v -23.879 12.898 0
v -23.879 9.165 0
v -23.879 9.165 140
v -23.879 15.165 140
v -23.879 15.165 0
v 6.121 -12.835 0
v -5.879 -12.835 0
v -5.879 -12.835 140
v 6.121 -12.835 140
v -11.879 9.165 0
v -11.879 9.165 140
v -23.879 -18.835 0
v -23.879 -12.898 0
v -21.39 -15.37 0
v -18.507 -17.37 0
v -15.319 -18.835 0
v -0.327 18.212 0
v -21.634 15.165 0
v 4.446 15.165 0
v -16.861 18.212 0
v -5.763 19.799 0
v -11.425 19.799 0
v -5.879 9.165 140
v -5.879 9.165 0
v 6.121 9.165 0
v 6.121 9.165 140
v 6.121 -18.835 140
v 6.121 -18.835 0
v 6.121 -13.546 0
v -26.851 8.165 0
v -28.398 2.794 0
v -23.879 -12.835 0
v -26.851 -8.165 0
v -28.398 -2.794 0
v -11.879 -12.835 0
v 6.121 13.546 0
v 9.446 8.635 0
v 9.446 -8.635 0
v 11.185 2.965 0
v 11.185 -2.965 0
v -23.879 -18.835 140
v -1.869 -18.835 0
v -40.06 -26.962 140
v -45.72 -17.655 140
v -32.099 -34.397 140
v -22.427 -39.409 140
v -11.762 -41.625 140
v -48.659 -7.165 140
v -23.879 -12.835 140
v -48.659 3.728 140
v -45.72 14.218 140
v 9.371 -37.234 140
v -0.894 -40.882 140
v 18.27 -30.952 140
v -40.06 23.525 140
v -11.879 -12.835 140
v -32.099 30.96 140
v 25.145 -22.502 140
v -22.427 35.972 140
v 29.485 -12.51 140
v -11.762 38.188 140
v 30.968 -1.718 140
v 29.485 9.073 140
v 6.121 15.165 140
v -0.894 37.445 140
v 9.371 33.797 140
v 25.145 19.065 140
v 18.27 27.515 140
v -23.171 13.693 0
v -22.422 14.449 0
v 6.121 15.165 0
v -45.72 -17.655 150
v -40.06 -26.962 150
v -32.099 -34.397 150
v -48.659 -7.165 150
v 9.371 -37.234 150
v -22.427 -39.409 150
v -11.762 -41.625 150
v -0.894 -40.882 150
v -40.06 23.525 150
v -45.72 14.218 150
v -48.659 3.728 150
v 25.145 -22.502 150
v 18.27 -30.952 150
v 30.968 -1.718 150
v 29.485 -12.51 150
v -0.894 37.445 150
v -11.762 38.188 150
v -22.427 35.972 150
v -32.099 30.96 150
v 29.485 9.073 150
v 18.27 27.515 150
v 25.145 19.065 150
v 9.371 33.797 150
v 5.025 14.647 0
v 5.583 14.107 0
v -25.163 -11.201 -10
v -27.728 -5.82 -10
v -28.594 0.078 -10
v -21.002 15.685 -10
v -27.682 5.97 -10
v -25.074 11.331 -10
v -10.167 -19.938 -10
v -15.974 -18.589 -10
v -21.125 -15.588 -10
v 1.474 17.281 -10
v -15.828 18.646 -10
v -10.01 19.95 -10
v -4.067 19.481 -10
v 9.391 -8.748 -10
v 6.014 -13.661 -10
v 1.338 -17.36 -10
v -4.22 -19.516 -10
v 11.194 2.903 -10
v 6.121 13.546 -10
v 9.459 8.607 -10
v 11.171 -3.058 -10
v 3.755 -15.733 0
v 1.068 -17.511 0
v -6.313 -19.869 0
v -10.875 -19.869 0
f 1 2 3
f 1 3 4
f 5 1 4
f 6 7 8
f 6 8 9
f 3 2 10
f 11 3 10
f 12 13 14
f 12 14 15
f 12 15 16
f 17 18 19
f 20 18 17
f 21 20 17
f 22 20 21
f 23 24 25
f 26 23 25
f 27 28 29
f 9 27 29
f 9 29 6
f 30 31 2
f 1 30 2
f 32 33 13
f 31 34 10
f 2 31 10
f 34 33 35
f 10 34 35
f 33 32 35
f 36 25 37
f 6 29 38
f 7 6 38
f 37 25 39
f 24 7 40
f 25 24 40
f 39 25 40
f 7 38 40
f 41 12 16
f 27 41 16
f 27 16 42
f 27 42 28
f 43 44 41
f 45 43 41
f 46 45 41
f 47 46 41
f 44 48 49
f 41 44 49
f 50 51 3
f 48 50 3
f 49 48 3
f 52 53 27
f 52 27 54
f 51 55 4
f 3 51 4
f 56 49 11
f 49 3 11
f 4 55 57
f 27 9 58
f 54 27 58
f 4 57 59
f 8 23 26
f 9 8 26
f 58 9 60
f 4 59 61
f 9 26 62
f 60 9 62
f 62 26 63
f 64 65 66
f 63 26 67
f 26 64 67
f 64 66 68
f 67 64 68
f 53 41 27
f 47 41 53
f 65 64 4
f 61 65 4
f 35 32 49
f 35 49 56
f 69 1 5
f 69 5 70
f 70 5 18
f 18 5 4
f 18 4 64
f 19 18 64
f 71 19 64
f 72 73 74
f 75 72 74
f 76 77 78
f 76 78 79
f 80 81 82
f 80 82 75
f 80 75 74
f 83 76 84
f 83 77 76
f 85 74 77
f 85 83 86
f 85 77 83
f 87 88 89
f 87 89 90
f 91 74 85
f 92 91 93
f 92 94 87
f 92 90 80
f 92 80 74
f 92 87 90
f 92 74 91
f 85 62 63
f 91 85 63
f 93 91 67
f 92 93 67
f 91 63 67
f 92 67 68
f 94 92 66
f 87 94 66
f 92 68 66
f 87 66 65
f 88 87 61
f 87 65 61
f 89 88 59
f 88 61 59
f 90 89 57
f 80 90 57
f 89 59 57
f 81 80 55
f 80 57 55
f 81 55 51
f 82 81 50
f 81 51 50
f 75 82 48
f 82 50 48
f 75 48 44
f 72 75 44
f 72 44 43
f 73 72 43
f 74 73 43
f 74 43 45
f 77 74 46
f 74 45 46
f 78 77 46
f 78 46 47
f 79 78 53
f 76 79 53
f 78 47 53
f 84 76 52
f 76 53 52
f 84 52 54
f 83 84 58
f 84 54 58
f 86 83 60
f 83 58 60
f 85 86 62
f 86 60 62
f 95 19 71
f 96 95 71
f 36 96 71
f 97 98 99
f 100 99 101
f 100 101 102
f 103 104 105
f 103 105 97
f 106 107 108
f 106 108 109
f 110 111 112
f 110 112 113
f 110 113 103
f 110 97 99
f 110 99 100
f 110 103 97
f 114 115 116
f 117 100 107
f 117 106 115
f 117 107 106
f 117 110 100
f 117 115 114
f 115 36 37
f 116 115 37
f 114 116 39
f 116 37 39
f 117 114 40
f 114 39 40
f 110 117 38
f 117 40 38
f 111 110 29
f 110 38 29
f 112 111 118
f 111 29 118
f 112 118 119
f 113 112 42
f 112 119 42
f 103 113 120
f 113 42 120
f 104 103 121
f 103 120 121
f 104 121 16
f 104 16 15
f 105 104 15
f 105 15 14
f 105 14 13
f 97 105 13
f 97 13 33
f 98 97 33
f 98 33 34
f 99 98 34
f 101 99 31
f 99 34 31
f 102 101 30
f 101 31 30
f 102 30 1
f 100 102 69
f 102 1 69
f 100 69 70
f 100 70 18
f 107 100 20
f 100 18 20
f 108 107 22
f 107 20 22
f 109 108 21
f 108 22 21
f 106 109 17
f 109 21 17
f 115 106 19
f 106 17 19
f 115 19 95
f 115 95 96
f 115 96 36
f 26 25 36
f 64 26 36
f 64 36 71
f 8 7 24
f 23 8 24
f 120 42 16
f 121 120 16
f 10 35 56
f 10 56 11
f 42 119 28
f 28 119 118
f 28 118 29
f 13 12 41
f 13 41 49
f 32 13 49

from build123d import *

# Parameters (mm, degrees)
SKETCH4_W           = 30
SKETCH4_H           = 6
SKETCH4_W_2         = 6
SKETCH4_H_2         = 22
BOSS_EXTRUDE1_DEPTH = 140
SKETCH6_R           = 20
BOSS_EXTRUDE2_DEPTH = 10
SKETCH7_R           = 40
BOSS_EXTRUDE3_DEPTH = 10


with BuildPart() as part:
    # Sketch4 → Boss-Extrude1 (new body)
    with BuildSketch(Plane(origin=(1.761790339, -4.428283824, 0), x_dir=(1, 0, 0), z_dir=(0, 0, 1))):
        with Locations((-10.641284089, 16.5928688)):
            Rectangle(SKETCH4_W, SKETCH4_H)
        with Locations((-10.641284089, 2.5928688)):
            Rectangle(SKETCH4_W_2, SKETCH4_H_2)
        with Locations((-10.641284089, -11.4071312)):
            Rectangle(SKETCH4_W, SKETCH4_H)
    extrude(amount=BOSS_EXTRUDE1_DEPTH)

    # Sketch6 → Boss-Extrude2 (add)
    with BuildSketch(Plane(origin=(0, 0, 0), x_dir=(-1, 0, 0), z_dir=(0, 0, -1))):
        with Locations(Location((8.59379802, 0, 0), (0, 0, 137.367685303))):
            Circle(SKETCH6_R)
    extrude(amount=BOSS_EXTRUDE2_DEPTH)

    # Sketch7 → Boss-Extrude3 (add)
    with BuildSketch(Plane.XY.offset(140)):
        with Locations((-9.032018986, -1.718473877)):
            Circle(SKETCH7_R)
    extrude(amount=BOSS_EXTRUDE3_DEPTH)


solid = part.part
